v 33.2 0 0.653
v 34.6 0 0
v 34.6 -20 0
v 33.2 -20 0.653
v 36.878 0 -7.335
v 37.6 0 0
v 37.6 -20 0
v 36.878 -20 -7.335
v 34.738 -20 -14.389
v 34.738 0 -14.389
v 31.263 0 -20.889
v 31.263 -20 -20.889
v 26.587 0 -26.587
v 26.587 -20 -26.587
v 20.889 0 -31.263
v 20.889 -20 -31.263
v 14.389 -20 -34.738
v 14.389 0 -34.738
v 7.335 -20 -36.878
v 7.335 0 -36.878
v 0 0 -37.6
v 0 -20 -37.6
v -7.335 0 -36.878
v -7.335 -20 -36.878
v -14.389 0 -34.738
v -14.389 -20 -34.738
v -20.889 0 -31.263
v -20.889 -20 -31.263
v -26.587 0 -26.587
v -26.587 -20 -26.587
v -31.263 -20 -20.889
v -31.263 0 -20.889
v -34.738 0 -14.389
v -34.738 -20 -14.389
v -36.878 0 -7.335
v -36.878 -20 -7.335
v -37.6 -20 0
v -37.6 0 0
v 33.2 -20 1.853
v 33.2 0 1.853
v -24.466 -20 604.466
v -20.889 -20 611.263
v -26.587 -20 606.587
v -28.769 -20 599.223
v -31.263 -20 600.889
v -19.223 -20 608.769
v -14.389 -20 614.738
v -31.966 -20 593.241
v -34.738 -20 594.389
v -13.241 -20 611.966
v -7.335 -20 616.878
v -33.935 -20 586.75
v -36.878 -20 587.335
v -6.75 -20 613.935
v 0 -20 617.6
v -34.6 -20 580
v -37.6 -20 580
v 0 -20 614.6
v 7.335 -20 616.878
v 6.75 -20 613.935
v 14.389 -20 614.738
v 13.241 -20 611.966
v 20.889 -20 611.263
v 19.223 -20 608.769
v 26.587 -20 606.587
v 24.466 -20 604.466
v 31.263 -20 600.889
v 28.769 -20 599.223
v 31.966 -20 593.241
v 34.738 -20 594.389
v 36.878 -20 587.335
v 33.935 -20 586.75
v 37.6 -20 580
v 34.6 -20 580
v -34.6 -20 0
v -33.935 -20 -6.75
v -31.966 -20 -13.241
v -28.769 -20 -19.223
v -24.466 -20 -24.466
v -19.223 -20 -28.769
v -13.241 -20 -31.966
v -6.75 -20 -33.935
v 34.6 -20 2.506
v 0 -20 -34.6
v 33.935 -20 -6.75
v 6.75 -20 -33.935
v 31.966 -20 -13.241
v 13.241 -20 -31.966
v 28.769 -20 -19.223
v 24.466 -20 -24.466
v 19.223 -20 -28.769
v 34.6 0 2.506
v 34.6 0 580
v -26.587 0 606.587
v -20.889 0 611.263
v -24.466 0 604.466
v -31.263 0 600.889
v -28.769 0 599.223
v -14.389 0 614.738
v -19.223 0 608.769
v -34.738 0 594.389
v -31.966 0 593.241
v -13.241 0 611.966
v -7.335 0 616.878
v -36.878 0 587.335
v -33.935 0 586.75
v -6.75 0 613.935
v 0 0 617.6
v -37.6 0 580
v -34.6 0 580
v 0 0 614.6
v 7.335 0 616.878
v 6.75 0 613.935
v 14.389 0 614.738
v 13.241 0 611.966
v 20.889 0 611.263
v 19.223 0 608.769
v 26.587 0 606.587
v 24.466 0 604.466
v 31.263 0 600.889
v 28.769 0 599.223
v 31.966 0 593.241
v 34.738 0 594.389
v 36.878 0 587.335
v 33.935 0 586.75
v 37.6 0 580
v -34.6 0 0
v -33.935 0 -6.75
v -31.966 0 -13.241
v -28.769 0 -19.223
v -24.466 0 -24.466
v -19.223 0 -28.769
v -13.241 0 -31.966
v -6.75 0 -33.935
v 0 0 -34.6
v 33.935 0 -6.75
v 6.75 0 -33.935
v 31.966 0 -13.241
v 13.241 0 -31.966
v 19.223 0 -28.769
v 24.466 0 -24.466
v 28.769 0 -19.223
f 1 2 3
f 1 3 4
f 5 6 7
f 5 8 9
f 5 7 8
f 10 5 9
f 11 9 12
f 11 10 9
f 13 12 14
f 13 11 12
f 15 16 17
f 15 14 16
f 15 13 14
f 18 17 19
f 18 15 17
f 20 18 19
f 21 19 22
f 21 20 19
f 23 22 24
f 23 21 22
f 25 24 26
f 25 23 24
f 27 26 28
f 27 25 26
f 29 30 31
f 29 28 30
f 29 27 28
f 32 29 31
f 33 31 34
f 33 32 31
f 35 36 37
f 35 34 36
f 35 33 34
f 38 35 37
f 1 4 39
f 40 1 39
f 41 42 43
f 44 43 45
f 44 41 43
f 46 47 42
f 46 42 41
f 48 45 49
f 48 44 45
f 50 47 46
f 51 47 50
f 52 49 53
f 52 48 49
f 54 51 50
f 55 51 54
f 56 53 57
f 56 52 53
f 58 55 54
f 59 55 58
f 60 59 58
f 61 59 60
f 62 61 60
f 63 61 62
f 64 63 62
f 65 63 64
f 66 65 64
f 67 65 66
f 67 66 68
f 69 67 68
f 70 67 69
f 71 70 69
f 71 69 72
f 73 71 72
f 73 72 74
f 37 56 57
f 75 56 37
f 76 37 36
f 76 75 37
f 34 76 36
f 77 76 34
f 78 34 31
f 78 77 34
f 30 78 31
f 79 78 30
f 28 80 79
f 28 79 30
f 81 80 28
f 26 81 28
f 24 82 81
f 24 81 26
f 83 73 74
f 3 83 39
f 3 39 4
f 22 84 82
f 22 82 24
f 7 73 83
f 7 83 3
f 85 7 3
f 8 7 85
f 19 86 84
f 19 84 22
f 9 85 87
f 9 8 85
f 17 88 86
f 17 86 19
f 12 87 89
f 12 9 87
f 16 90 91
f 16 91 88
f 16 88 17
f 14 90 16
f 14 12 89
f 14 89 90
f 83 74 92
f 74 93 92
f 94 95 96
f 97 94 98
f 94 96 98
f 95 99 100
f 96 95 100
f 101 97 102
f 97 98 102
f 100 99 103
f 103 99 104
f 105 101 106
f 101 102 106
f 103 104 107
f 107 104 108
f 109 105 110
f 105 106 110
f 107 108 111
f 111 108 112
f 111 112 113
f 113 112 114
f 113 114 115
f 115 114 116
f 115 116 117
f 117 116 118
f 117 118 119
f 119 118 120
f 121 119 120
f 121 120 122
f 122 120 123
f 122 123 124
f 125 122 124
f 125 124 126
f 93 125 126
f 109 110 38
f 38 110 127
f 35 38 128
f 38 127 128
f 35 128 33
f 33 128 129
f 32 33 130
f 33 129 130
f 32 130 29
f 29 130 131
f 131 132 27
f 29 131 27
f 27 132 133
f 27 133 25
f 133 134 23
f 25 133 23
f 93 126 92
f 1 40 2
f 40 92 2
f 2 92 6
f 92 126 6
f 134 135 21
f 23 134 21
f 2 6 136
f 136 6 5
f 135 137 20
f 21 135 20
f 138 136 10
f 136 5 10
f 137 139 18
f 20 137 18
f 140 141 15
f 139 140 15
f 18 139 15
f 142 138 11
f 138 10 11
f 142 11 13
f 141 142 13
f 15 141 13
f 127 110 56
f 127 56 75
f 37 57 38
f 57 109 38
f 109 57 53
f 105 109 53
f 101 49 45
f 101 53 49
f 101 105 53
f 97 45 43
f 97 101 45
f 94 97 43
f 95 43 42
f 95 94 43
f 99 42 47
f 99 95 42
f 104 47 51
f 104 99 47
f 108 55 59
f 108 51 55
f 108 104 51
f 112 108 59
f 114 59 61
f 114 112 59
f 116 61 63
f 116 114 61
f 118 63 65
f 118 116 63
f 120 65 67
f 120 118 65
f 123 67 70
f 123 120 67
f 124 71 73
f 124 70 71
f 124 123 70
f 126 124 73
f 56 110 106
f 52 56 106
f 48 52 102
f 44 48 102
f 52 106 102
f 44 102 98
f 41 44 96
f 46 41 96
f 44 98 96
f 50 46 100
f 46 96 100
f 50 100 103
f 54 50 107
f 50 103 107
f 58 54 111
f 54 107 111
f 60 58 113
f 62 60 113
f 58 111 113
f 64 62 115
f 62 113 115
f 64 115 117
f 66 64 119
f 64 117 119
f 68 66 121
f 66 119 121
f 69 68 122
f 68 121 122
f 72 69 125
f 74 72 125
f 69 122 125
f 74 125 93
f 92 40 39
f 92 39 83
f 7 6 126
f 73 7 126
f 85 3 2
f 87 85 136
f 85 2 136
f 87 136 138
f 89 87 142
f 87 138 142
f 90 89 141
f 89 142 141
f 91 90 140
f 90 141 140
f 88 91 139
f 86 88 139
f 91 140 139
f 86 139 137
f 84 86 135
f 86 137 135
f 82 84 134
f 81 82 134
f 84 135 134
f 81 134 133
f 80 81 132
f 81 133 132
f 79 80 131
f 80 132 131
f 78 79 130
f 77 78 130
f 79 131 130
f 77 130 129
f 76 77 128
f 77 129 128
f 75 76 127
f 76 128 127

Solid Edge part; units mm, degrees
sketch "Sketch1" plane through (0, 0, 0) normal (0, -1, 0) x (1, 0, 0)
  line L0 (37.6, 0) -> (37.6, 580)
  arc A0 (37.6, 580) -> (-37.6, 580) centre (0, 580) ccw
  line L1 (-37.6, 580) -> (-37.6, 0)
  arc A1 (-37.6, 0) -> (37.6, 0) centre (0, 0) ccw
  line L2 (34.6, 580) -> (34.6, 0)
  arc A2 (-34.6, 580) -> (34.6, 580) centre (0, 580) cw
  line L3 (-34.6, 580) -> (-34.6, 0)
  arc A3 (34.6, 0) -> (-34.6, 0) centre (0, 0) cw
extrude "Protrusion1" add sketch "Sketch1" along normal blind 20
sketch "Sketch2" plane through (0, 0, 0) normal (0, -1, 0) x (1, 0, 0)
  line L0 (33.2, 0.6528) -> (33.2, 1.8528)
  line L1 (33.2, 1.8528) -> (34.6, 2.5057)
  line L2 (34.6, 2.5057) -> (34.6, 0)
  line L3 (34.6, 0) -> (33.2, 0.6528)
extrude "Extrusionsausprägung_2" add sketch "Sketch2" along normal blind 20
pattern "Pattern1" [suppressed]
mirror "Mirror1" [suppressed]
